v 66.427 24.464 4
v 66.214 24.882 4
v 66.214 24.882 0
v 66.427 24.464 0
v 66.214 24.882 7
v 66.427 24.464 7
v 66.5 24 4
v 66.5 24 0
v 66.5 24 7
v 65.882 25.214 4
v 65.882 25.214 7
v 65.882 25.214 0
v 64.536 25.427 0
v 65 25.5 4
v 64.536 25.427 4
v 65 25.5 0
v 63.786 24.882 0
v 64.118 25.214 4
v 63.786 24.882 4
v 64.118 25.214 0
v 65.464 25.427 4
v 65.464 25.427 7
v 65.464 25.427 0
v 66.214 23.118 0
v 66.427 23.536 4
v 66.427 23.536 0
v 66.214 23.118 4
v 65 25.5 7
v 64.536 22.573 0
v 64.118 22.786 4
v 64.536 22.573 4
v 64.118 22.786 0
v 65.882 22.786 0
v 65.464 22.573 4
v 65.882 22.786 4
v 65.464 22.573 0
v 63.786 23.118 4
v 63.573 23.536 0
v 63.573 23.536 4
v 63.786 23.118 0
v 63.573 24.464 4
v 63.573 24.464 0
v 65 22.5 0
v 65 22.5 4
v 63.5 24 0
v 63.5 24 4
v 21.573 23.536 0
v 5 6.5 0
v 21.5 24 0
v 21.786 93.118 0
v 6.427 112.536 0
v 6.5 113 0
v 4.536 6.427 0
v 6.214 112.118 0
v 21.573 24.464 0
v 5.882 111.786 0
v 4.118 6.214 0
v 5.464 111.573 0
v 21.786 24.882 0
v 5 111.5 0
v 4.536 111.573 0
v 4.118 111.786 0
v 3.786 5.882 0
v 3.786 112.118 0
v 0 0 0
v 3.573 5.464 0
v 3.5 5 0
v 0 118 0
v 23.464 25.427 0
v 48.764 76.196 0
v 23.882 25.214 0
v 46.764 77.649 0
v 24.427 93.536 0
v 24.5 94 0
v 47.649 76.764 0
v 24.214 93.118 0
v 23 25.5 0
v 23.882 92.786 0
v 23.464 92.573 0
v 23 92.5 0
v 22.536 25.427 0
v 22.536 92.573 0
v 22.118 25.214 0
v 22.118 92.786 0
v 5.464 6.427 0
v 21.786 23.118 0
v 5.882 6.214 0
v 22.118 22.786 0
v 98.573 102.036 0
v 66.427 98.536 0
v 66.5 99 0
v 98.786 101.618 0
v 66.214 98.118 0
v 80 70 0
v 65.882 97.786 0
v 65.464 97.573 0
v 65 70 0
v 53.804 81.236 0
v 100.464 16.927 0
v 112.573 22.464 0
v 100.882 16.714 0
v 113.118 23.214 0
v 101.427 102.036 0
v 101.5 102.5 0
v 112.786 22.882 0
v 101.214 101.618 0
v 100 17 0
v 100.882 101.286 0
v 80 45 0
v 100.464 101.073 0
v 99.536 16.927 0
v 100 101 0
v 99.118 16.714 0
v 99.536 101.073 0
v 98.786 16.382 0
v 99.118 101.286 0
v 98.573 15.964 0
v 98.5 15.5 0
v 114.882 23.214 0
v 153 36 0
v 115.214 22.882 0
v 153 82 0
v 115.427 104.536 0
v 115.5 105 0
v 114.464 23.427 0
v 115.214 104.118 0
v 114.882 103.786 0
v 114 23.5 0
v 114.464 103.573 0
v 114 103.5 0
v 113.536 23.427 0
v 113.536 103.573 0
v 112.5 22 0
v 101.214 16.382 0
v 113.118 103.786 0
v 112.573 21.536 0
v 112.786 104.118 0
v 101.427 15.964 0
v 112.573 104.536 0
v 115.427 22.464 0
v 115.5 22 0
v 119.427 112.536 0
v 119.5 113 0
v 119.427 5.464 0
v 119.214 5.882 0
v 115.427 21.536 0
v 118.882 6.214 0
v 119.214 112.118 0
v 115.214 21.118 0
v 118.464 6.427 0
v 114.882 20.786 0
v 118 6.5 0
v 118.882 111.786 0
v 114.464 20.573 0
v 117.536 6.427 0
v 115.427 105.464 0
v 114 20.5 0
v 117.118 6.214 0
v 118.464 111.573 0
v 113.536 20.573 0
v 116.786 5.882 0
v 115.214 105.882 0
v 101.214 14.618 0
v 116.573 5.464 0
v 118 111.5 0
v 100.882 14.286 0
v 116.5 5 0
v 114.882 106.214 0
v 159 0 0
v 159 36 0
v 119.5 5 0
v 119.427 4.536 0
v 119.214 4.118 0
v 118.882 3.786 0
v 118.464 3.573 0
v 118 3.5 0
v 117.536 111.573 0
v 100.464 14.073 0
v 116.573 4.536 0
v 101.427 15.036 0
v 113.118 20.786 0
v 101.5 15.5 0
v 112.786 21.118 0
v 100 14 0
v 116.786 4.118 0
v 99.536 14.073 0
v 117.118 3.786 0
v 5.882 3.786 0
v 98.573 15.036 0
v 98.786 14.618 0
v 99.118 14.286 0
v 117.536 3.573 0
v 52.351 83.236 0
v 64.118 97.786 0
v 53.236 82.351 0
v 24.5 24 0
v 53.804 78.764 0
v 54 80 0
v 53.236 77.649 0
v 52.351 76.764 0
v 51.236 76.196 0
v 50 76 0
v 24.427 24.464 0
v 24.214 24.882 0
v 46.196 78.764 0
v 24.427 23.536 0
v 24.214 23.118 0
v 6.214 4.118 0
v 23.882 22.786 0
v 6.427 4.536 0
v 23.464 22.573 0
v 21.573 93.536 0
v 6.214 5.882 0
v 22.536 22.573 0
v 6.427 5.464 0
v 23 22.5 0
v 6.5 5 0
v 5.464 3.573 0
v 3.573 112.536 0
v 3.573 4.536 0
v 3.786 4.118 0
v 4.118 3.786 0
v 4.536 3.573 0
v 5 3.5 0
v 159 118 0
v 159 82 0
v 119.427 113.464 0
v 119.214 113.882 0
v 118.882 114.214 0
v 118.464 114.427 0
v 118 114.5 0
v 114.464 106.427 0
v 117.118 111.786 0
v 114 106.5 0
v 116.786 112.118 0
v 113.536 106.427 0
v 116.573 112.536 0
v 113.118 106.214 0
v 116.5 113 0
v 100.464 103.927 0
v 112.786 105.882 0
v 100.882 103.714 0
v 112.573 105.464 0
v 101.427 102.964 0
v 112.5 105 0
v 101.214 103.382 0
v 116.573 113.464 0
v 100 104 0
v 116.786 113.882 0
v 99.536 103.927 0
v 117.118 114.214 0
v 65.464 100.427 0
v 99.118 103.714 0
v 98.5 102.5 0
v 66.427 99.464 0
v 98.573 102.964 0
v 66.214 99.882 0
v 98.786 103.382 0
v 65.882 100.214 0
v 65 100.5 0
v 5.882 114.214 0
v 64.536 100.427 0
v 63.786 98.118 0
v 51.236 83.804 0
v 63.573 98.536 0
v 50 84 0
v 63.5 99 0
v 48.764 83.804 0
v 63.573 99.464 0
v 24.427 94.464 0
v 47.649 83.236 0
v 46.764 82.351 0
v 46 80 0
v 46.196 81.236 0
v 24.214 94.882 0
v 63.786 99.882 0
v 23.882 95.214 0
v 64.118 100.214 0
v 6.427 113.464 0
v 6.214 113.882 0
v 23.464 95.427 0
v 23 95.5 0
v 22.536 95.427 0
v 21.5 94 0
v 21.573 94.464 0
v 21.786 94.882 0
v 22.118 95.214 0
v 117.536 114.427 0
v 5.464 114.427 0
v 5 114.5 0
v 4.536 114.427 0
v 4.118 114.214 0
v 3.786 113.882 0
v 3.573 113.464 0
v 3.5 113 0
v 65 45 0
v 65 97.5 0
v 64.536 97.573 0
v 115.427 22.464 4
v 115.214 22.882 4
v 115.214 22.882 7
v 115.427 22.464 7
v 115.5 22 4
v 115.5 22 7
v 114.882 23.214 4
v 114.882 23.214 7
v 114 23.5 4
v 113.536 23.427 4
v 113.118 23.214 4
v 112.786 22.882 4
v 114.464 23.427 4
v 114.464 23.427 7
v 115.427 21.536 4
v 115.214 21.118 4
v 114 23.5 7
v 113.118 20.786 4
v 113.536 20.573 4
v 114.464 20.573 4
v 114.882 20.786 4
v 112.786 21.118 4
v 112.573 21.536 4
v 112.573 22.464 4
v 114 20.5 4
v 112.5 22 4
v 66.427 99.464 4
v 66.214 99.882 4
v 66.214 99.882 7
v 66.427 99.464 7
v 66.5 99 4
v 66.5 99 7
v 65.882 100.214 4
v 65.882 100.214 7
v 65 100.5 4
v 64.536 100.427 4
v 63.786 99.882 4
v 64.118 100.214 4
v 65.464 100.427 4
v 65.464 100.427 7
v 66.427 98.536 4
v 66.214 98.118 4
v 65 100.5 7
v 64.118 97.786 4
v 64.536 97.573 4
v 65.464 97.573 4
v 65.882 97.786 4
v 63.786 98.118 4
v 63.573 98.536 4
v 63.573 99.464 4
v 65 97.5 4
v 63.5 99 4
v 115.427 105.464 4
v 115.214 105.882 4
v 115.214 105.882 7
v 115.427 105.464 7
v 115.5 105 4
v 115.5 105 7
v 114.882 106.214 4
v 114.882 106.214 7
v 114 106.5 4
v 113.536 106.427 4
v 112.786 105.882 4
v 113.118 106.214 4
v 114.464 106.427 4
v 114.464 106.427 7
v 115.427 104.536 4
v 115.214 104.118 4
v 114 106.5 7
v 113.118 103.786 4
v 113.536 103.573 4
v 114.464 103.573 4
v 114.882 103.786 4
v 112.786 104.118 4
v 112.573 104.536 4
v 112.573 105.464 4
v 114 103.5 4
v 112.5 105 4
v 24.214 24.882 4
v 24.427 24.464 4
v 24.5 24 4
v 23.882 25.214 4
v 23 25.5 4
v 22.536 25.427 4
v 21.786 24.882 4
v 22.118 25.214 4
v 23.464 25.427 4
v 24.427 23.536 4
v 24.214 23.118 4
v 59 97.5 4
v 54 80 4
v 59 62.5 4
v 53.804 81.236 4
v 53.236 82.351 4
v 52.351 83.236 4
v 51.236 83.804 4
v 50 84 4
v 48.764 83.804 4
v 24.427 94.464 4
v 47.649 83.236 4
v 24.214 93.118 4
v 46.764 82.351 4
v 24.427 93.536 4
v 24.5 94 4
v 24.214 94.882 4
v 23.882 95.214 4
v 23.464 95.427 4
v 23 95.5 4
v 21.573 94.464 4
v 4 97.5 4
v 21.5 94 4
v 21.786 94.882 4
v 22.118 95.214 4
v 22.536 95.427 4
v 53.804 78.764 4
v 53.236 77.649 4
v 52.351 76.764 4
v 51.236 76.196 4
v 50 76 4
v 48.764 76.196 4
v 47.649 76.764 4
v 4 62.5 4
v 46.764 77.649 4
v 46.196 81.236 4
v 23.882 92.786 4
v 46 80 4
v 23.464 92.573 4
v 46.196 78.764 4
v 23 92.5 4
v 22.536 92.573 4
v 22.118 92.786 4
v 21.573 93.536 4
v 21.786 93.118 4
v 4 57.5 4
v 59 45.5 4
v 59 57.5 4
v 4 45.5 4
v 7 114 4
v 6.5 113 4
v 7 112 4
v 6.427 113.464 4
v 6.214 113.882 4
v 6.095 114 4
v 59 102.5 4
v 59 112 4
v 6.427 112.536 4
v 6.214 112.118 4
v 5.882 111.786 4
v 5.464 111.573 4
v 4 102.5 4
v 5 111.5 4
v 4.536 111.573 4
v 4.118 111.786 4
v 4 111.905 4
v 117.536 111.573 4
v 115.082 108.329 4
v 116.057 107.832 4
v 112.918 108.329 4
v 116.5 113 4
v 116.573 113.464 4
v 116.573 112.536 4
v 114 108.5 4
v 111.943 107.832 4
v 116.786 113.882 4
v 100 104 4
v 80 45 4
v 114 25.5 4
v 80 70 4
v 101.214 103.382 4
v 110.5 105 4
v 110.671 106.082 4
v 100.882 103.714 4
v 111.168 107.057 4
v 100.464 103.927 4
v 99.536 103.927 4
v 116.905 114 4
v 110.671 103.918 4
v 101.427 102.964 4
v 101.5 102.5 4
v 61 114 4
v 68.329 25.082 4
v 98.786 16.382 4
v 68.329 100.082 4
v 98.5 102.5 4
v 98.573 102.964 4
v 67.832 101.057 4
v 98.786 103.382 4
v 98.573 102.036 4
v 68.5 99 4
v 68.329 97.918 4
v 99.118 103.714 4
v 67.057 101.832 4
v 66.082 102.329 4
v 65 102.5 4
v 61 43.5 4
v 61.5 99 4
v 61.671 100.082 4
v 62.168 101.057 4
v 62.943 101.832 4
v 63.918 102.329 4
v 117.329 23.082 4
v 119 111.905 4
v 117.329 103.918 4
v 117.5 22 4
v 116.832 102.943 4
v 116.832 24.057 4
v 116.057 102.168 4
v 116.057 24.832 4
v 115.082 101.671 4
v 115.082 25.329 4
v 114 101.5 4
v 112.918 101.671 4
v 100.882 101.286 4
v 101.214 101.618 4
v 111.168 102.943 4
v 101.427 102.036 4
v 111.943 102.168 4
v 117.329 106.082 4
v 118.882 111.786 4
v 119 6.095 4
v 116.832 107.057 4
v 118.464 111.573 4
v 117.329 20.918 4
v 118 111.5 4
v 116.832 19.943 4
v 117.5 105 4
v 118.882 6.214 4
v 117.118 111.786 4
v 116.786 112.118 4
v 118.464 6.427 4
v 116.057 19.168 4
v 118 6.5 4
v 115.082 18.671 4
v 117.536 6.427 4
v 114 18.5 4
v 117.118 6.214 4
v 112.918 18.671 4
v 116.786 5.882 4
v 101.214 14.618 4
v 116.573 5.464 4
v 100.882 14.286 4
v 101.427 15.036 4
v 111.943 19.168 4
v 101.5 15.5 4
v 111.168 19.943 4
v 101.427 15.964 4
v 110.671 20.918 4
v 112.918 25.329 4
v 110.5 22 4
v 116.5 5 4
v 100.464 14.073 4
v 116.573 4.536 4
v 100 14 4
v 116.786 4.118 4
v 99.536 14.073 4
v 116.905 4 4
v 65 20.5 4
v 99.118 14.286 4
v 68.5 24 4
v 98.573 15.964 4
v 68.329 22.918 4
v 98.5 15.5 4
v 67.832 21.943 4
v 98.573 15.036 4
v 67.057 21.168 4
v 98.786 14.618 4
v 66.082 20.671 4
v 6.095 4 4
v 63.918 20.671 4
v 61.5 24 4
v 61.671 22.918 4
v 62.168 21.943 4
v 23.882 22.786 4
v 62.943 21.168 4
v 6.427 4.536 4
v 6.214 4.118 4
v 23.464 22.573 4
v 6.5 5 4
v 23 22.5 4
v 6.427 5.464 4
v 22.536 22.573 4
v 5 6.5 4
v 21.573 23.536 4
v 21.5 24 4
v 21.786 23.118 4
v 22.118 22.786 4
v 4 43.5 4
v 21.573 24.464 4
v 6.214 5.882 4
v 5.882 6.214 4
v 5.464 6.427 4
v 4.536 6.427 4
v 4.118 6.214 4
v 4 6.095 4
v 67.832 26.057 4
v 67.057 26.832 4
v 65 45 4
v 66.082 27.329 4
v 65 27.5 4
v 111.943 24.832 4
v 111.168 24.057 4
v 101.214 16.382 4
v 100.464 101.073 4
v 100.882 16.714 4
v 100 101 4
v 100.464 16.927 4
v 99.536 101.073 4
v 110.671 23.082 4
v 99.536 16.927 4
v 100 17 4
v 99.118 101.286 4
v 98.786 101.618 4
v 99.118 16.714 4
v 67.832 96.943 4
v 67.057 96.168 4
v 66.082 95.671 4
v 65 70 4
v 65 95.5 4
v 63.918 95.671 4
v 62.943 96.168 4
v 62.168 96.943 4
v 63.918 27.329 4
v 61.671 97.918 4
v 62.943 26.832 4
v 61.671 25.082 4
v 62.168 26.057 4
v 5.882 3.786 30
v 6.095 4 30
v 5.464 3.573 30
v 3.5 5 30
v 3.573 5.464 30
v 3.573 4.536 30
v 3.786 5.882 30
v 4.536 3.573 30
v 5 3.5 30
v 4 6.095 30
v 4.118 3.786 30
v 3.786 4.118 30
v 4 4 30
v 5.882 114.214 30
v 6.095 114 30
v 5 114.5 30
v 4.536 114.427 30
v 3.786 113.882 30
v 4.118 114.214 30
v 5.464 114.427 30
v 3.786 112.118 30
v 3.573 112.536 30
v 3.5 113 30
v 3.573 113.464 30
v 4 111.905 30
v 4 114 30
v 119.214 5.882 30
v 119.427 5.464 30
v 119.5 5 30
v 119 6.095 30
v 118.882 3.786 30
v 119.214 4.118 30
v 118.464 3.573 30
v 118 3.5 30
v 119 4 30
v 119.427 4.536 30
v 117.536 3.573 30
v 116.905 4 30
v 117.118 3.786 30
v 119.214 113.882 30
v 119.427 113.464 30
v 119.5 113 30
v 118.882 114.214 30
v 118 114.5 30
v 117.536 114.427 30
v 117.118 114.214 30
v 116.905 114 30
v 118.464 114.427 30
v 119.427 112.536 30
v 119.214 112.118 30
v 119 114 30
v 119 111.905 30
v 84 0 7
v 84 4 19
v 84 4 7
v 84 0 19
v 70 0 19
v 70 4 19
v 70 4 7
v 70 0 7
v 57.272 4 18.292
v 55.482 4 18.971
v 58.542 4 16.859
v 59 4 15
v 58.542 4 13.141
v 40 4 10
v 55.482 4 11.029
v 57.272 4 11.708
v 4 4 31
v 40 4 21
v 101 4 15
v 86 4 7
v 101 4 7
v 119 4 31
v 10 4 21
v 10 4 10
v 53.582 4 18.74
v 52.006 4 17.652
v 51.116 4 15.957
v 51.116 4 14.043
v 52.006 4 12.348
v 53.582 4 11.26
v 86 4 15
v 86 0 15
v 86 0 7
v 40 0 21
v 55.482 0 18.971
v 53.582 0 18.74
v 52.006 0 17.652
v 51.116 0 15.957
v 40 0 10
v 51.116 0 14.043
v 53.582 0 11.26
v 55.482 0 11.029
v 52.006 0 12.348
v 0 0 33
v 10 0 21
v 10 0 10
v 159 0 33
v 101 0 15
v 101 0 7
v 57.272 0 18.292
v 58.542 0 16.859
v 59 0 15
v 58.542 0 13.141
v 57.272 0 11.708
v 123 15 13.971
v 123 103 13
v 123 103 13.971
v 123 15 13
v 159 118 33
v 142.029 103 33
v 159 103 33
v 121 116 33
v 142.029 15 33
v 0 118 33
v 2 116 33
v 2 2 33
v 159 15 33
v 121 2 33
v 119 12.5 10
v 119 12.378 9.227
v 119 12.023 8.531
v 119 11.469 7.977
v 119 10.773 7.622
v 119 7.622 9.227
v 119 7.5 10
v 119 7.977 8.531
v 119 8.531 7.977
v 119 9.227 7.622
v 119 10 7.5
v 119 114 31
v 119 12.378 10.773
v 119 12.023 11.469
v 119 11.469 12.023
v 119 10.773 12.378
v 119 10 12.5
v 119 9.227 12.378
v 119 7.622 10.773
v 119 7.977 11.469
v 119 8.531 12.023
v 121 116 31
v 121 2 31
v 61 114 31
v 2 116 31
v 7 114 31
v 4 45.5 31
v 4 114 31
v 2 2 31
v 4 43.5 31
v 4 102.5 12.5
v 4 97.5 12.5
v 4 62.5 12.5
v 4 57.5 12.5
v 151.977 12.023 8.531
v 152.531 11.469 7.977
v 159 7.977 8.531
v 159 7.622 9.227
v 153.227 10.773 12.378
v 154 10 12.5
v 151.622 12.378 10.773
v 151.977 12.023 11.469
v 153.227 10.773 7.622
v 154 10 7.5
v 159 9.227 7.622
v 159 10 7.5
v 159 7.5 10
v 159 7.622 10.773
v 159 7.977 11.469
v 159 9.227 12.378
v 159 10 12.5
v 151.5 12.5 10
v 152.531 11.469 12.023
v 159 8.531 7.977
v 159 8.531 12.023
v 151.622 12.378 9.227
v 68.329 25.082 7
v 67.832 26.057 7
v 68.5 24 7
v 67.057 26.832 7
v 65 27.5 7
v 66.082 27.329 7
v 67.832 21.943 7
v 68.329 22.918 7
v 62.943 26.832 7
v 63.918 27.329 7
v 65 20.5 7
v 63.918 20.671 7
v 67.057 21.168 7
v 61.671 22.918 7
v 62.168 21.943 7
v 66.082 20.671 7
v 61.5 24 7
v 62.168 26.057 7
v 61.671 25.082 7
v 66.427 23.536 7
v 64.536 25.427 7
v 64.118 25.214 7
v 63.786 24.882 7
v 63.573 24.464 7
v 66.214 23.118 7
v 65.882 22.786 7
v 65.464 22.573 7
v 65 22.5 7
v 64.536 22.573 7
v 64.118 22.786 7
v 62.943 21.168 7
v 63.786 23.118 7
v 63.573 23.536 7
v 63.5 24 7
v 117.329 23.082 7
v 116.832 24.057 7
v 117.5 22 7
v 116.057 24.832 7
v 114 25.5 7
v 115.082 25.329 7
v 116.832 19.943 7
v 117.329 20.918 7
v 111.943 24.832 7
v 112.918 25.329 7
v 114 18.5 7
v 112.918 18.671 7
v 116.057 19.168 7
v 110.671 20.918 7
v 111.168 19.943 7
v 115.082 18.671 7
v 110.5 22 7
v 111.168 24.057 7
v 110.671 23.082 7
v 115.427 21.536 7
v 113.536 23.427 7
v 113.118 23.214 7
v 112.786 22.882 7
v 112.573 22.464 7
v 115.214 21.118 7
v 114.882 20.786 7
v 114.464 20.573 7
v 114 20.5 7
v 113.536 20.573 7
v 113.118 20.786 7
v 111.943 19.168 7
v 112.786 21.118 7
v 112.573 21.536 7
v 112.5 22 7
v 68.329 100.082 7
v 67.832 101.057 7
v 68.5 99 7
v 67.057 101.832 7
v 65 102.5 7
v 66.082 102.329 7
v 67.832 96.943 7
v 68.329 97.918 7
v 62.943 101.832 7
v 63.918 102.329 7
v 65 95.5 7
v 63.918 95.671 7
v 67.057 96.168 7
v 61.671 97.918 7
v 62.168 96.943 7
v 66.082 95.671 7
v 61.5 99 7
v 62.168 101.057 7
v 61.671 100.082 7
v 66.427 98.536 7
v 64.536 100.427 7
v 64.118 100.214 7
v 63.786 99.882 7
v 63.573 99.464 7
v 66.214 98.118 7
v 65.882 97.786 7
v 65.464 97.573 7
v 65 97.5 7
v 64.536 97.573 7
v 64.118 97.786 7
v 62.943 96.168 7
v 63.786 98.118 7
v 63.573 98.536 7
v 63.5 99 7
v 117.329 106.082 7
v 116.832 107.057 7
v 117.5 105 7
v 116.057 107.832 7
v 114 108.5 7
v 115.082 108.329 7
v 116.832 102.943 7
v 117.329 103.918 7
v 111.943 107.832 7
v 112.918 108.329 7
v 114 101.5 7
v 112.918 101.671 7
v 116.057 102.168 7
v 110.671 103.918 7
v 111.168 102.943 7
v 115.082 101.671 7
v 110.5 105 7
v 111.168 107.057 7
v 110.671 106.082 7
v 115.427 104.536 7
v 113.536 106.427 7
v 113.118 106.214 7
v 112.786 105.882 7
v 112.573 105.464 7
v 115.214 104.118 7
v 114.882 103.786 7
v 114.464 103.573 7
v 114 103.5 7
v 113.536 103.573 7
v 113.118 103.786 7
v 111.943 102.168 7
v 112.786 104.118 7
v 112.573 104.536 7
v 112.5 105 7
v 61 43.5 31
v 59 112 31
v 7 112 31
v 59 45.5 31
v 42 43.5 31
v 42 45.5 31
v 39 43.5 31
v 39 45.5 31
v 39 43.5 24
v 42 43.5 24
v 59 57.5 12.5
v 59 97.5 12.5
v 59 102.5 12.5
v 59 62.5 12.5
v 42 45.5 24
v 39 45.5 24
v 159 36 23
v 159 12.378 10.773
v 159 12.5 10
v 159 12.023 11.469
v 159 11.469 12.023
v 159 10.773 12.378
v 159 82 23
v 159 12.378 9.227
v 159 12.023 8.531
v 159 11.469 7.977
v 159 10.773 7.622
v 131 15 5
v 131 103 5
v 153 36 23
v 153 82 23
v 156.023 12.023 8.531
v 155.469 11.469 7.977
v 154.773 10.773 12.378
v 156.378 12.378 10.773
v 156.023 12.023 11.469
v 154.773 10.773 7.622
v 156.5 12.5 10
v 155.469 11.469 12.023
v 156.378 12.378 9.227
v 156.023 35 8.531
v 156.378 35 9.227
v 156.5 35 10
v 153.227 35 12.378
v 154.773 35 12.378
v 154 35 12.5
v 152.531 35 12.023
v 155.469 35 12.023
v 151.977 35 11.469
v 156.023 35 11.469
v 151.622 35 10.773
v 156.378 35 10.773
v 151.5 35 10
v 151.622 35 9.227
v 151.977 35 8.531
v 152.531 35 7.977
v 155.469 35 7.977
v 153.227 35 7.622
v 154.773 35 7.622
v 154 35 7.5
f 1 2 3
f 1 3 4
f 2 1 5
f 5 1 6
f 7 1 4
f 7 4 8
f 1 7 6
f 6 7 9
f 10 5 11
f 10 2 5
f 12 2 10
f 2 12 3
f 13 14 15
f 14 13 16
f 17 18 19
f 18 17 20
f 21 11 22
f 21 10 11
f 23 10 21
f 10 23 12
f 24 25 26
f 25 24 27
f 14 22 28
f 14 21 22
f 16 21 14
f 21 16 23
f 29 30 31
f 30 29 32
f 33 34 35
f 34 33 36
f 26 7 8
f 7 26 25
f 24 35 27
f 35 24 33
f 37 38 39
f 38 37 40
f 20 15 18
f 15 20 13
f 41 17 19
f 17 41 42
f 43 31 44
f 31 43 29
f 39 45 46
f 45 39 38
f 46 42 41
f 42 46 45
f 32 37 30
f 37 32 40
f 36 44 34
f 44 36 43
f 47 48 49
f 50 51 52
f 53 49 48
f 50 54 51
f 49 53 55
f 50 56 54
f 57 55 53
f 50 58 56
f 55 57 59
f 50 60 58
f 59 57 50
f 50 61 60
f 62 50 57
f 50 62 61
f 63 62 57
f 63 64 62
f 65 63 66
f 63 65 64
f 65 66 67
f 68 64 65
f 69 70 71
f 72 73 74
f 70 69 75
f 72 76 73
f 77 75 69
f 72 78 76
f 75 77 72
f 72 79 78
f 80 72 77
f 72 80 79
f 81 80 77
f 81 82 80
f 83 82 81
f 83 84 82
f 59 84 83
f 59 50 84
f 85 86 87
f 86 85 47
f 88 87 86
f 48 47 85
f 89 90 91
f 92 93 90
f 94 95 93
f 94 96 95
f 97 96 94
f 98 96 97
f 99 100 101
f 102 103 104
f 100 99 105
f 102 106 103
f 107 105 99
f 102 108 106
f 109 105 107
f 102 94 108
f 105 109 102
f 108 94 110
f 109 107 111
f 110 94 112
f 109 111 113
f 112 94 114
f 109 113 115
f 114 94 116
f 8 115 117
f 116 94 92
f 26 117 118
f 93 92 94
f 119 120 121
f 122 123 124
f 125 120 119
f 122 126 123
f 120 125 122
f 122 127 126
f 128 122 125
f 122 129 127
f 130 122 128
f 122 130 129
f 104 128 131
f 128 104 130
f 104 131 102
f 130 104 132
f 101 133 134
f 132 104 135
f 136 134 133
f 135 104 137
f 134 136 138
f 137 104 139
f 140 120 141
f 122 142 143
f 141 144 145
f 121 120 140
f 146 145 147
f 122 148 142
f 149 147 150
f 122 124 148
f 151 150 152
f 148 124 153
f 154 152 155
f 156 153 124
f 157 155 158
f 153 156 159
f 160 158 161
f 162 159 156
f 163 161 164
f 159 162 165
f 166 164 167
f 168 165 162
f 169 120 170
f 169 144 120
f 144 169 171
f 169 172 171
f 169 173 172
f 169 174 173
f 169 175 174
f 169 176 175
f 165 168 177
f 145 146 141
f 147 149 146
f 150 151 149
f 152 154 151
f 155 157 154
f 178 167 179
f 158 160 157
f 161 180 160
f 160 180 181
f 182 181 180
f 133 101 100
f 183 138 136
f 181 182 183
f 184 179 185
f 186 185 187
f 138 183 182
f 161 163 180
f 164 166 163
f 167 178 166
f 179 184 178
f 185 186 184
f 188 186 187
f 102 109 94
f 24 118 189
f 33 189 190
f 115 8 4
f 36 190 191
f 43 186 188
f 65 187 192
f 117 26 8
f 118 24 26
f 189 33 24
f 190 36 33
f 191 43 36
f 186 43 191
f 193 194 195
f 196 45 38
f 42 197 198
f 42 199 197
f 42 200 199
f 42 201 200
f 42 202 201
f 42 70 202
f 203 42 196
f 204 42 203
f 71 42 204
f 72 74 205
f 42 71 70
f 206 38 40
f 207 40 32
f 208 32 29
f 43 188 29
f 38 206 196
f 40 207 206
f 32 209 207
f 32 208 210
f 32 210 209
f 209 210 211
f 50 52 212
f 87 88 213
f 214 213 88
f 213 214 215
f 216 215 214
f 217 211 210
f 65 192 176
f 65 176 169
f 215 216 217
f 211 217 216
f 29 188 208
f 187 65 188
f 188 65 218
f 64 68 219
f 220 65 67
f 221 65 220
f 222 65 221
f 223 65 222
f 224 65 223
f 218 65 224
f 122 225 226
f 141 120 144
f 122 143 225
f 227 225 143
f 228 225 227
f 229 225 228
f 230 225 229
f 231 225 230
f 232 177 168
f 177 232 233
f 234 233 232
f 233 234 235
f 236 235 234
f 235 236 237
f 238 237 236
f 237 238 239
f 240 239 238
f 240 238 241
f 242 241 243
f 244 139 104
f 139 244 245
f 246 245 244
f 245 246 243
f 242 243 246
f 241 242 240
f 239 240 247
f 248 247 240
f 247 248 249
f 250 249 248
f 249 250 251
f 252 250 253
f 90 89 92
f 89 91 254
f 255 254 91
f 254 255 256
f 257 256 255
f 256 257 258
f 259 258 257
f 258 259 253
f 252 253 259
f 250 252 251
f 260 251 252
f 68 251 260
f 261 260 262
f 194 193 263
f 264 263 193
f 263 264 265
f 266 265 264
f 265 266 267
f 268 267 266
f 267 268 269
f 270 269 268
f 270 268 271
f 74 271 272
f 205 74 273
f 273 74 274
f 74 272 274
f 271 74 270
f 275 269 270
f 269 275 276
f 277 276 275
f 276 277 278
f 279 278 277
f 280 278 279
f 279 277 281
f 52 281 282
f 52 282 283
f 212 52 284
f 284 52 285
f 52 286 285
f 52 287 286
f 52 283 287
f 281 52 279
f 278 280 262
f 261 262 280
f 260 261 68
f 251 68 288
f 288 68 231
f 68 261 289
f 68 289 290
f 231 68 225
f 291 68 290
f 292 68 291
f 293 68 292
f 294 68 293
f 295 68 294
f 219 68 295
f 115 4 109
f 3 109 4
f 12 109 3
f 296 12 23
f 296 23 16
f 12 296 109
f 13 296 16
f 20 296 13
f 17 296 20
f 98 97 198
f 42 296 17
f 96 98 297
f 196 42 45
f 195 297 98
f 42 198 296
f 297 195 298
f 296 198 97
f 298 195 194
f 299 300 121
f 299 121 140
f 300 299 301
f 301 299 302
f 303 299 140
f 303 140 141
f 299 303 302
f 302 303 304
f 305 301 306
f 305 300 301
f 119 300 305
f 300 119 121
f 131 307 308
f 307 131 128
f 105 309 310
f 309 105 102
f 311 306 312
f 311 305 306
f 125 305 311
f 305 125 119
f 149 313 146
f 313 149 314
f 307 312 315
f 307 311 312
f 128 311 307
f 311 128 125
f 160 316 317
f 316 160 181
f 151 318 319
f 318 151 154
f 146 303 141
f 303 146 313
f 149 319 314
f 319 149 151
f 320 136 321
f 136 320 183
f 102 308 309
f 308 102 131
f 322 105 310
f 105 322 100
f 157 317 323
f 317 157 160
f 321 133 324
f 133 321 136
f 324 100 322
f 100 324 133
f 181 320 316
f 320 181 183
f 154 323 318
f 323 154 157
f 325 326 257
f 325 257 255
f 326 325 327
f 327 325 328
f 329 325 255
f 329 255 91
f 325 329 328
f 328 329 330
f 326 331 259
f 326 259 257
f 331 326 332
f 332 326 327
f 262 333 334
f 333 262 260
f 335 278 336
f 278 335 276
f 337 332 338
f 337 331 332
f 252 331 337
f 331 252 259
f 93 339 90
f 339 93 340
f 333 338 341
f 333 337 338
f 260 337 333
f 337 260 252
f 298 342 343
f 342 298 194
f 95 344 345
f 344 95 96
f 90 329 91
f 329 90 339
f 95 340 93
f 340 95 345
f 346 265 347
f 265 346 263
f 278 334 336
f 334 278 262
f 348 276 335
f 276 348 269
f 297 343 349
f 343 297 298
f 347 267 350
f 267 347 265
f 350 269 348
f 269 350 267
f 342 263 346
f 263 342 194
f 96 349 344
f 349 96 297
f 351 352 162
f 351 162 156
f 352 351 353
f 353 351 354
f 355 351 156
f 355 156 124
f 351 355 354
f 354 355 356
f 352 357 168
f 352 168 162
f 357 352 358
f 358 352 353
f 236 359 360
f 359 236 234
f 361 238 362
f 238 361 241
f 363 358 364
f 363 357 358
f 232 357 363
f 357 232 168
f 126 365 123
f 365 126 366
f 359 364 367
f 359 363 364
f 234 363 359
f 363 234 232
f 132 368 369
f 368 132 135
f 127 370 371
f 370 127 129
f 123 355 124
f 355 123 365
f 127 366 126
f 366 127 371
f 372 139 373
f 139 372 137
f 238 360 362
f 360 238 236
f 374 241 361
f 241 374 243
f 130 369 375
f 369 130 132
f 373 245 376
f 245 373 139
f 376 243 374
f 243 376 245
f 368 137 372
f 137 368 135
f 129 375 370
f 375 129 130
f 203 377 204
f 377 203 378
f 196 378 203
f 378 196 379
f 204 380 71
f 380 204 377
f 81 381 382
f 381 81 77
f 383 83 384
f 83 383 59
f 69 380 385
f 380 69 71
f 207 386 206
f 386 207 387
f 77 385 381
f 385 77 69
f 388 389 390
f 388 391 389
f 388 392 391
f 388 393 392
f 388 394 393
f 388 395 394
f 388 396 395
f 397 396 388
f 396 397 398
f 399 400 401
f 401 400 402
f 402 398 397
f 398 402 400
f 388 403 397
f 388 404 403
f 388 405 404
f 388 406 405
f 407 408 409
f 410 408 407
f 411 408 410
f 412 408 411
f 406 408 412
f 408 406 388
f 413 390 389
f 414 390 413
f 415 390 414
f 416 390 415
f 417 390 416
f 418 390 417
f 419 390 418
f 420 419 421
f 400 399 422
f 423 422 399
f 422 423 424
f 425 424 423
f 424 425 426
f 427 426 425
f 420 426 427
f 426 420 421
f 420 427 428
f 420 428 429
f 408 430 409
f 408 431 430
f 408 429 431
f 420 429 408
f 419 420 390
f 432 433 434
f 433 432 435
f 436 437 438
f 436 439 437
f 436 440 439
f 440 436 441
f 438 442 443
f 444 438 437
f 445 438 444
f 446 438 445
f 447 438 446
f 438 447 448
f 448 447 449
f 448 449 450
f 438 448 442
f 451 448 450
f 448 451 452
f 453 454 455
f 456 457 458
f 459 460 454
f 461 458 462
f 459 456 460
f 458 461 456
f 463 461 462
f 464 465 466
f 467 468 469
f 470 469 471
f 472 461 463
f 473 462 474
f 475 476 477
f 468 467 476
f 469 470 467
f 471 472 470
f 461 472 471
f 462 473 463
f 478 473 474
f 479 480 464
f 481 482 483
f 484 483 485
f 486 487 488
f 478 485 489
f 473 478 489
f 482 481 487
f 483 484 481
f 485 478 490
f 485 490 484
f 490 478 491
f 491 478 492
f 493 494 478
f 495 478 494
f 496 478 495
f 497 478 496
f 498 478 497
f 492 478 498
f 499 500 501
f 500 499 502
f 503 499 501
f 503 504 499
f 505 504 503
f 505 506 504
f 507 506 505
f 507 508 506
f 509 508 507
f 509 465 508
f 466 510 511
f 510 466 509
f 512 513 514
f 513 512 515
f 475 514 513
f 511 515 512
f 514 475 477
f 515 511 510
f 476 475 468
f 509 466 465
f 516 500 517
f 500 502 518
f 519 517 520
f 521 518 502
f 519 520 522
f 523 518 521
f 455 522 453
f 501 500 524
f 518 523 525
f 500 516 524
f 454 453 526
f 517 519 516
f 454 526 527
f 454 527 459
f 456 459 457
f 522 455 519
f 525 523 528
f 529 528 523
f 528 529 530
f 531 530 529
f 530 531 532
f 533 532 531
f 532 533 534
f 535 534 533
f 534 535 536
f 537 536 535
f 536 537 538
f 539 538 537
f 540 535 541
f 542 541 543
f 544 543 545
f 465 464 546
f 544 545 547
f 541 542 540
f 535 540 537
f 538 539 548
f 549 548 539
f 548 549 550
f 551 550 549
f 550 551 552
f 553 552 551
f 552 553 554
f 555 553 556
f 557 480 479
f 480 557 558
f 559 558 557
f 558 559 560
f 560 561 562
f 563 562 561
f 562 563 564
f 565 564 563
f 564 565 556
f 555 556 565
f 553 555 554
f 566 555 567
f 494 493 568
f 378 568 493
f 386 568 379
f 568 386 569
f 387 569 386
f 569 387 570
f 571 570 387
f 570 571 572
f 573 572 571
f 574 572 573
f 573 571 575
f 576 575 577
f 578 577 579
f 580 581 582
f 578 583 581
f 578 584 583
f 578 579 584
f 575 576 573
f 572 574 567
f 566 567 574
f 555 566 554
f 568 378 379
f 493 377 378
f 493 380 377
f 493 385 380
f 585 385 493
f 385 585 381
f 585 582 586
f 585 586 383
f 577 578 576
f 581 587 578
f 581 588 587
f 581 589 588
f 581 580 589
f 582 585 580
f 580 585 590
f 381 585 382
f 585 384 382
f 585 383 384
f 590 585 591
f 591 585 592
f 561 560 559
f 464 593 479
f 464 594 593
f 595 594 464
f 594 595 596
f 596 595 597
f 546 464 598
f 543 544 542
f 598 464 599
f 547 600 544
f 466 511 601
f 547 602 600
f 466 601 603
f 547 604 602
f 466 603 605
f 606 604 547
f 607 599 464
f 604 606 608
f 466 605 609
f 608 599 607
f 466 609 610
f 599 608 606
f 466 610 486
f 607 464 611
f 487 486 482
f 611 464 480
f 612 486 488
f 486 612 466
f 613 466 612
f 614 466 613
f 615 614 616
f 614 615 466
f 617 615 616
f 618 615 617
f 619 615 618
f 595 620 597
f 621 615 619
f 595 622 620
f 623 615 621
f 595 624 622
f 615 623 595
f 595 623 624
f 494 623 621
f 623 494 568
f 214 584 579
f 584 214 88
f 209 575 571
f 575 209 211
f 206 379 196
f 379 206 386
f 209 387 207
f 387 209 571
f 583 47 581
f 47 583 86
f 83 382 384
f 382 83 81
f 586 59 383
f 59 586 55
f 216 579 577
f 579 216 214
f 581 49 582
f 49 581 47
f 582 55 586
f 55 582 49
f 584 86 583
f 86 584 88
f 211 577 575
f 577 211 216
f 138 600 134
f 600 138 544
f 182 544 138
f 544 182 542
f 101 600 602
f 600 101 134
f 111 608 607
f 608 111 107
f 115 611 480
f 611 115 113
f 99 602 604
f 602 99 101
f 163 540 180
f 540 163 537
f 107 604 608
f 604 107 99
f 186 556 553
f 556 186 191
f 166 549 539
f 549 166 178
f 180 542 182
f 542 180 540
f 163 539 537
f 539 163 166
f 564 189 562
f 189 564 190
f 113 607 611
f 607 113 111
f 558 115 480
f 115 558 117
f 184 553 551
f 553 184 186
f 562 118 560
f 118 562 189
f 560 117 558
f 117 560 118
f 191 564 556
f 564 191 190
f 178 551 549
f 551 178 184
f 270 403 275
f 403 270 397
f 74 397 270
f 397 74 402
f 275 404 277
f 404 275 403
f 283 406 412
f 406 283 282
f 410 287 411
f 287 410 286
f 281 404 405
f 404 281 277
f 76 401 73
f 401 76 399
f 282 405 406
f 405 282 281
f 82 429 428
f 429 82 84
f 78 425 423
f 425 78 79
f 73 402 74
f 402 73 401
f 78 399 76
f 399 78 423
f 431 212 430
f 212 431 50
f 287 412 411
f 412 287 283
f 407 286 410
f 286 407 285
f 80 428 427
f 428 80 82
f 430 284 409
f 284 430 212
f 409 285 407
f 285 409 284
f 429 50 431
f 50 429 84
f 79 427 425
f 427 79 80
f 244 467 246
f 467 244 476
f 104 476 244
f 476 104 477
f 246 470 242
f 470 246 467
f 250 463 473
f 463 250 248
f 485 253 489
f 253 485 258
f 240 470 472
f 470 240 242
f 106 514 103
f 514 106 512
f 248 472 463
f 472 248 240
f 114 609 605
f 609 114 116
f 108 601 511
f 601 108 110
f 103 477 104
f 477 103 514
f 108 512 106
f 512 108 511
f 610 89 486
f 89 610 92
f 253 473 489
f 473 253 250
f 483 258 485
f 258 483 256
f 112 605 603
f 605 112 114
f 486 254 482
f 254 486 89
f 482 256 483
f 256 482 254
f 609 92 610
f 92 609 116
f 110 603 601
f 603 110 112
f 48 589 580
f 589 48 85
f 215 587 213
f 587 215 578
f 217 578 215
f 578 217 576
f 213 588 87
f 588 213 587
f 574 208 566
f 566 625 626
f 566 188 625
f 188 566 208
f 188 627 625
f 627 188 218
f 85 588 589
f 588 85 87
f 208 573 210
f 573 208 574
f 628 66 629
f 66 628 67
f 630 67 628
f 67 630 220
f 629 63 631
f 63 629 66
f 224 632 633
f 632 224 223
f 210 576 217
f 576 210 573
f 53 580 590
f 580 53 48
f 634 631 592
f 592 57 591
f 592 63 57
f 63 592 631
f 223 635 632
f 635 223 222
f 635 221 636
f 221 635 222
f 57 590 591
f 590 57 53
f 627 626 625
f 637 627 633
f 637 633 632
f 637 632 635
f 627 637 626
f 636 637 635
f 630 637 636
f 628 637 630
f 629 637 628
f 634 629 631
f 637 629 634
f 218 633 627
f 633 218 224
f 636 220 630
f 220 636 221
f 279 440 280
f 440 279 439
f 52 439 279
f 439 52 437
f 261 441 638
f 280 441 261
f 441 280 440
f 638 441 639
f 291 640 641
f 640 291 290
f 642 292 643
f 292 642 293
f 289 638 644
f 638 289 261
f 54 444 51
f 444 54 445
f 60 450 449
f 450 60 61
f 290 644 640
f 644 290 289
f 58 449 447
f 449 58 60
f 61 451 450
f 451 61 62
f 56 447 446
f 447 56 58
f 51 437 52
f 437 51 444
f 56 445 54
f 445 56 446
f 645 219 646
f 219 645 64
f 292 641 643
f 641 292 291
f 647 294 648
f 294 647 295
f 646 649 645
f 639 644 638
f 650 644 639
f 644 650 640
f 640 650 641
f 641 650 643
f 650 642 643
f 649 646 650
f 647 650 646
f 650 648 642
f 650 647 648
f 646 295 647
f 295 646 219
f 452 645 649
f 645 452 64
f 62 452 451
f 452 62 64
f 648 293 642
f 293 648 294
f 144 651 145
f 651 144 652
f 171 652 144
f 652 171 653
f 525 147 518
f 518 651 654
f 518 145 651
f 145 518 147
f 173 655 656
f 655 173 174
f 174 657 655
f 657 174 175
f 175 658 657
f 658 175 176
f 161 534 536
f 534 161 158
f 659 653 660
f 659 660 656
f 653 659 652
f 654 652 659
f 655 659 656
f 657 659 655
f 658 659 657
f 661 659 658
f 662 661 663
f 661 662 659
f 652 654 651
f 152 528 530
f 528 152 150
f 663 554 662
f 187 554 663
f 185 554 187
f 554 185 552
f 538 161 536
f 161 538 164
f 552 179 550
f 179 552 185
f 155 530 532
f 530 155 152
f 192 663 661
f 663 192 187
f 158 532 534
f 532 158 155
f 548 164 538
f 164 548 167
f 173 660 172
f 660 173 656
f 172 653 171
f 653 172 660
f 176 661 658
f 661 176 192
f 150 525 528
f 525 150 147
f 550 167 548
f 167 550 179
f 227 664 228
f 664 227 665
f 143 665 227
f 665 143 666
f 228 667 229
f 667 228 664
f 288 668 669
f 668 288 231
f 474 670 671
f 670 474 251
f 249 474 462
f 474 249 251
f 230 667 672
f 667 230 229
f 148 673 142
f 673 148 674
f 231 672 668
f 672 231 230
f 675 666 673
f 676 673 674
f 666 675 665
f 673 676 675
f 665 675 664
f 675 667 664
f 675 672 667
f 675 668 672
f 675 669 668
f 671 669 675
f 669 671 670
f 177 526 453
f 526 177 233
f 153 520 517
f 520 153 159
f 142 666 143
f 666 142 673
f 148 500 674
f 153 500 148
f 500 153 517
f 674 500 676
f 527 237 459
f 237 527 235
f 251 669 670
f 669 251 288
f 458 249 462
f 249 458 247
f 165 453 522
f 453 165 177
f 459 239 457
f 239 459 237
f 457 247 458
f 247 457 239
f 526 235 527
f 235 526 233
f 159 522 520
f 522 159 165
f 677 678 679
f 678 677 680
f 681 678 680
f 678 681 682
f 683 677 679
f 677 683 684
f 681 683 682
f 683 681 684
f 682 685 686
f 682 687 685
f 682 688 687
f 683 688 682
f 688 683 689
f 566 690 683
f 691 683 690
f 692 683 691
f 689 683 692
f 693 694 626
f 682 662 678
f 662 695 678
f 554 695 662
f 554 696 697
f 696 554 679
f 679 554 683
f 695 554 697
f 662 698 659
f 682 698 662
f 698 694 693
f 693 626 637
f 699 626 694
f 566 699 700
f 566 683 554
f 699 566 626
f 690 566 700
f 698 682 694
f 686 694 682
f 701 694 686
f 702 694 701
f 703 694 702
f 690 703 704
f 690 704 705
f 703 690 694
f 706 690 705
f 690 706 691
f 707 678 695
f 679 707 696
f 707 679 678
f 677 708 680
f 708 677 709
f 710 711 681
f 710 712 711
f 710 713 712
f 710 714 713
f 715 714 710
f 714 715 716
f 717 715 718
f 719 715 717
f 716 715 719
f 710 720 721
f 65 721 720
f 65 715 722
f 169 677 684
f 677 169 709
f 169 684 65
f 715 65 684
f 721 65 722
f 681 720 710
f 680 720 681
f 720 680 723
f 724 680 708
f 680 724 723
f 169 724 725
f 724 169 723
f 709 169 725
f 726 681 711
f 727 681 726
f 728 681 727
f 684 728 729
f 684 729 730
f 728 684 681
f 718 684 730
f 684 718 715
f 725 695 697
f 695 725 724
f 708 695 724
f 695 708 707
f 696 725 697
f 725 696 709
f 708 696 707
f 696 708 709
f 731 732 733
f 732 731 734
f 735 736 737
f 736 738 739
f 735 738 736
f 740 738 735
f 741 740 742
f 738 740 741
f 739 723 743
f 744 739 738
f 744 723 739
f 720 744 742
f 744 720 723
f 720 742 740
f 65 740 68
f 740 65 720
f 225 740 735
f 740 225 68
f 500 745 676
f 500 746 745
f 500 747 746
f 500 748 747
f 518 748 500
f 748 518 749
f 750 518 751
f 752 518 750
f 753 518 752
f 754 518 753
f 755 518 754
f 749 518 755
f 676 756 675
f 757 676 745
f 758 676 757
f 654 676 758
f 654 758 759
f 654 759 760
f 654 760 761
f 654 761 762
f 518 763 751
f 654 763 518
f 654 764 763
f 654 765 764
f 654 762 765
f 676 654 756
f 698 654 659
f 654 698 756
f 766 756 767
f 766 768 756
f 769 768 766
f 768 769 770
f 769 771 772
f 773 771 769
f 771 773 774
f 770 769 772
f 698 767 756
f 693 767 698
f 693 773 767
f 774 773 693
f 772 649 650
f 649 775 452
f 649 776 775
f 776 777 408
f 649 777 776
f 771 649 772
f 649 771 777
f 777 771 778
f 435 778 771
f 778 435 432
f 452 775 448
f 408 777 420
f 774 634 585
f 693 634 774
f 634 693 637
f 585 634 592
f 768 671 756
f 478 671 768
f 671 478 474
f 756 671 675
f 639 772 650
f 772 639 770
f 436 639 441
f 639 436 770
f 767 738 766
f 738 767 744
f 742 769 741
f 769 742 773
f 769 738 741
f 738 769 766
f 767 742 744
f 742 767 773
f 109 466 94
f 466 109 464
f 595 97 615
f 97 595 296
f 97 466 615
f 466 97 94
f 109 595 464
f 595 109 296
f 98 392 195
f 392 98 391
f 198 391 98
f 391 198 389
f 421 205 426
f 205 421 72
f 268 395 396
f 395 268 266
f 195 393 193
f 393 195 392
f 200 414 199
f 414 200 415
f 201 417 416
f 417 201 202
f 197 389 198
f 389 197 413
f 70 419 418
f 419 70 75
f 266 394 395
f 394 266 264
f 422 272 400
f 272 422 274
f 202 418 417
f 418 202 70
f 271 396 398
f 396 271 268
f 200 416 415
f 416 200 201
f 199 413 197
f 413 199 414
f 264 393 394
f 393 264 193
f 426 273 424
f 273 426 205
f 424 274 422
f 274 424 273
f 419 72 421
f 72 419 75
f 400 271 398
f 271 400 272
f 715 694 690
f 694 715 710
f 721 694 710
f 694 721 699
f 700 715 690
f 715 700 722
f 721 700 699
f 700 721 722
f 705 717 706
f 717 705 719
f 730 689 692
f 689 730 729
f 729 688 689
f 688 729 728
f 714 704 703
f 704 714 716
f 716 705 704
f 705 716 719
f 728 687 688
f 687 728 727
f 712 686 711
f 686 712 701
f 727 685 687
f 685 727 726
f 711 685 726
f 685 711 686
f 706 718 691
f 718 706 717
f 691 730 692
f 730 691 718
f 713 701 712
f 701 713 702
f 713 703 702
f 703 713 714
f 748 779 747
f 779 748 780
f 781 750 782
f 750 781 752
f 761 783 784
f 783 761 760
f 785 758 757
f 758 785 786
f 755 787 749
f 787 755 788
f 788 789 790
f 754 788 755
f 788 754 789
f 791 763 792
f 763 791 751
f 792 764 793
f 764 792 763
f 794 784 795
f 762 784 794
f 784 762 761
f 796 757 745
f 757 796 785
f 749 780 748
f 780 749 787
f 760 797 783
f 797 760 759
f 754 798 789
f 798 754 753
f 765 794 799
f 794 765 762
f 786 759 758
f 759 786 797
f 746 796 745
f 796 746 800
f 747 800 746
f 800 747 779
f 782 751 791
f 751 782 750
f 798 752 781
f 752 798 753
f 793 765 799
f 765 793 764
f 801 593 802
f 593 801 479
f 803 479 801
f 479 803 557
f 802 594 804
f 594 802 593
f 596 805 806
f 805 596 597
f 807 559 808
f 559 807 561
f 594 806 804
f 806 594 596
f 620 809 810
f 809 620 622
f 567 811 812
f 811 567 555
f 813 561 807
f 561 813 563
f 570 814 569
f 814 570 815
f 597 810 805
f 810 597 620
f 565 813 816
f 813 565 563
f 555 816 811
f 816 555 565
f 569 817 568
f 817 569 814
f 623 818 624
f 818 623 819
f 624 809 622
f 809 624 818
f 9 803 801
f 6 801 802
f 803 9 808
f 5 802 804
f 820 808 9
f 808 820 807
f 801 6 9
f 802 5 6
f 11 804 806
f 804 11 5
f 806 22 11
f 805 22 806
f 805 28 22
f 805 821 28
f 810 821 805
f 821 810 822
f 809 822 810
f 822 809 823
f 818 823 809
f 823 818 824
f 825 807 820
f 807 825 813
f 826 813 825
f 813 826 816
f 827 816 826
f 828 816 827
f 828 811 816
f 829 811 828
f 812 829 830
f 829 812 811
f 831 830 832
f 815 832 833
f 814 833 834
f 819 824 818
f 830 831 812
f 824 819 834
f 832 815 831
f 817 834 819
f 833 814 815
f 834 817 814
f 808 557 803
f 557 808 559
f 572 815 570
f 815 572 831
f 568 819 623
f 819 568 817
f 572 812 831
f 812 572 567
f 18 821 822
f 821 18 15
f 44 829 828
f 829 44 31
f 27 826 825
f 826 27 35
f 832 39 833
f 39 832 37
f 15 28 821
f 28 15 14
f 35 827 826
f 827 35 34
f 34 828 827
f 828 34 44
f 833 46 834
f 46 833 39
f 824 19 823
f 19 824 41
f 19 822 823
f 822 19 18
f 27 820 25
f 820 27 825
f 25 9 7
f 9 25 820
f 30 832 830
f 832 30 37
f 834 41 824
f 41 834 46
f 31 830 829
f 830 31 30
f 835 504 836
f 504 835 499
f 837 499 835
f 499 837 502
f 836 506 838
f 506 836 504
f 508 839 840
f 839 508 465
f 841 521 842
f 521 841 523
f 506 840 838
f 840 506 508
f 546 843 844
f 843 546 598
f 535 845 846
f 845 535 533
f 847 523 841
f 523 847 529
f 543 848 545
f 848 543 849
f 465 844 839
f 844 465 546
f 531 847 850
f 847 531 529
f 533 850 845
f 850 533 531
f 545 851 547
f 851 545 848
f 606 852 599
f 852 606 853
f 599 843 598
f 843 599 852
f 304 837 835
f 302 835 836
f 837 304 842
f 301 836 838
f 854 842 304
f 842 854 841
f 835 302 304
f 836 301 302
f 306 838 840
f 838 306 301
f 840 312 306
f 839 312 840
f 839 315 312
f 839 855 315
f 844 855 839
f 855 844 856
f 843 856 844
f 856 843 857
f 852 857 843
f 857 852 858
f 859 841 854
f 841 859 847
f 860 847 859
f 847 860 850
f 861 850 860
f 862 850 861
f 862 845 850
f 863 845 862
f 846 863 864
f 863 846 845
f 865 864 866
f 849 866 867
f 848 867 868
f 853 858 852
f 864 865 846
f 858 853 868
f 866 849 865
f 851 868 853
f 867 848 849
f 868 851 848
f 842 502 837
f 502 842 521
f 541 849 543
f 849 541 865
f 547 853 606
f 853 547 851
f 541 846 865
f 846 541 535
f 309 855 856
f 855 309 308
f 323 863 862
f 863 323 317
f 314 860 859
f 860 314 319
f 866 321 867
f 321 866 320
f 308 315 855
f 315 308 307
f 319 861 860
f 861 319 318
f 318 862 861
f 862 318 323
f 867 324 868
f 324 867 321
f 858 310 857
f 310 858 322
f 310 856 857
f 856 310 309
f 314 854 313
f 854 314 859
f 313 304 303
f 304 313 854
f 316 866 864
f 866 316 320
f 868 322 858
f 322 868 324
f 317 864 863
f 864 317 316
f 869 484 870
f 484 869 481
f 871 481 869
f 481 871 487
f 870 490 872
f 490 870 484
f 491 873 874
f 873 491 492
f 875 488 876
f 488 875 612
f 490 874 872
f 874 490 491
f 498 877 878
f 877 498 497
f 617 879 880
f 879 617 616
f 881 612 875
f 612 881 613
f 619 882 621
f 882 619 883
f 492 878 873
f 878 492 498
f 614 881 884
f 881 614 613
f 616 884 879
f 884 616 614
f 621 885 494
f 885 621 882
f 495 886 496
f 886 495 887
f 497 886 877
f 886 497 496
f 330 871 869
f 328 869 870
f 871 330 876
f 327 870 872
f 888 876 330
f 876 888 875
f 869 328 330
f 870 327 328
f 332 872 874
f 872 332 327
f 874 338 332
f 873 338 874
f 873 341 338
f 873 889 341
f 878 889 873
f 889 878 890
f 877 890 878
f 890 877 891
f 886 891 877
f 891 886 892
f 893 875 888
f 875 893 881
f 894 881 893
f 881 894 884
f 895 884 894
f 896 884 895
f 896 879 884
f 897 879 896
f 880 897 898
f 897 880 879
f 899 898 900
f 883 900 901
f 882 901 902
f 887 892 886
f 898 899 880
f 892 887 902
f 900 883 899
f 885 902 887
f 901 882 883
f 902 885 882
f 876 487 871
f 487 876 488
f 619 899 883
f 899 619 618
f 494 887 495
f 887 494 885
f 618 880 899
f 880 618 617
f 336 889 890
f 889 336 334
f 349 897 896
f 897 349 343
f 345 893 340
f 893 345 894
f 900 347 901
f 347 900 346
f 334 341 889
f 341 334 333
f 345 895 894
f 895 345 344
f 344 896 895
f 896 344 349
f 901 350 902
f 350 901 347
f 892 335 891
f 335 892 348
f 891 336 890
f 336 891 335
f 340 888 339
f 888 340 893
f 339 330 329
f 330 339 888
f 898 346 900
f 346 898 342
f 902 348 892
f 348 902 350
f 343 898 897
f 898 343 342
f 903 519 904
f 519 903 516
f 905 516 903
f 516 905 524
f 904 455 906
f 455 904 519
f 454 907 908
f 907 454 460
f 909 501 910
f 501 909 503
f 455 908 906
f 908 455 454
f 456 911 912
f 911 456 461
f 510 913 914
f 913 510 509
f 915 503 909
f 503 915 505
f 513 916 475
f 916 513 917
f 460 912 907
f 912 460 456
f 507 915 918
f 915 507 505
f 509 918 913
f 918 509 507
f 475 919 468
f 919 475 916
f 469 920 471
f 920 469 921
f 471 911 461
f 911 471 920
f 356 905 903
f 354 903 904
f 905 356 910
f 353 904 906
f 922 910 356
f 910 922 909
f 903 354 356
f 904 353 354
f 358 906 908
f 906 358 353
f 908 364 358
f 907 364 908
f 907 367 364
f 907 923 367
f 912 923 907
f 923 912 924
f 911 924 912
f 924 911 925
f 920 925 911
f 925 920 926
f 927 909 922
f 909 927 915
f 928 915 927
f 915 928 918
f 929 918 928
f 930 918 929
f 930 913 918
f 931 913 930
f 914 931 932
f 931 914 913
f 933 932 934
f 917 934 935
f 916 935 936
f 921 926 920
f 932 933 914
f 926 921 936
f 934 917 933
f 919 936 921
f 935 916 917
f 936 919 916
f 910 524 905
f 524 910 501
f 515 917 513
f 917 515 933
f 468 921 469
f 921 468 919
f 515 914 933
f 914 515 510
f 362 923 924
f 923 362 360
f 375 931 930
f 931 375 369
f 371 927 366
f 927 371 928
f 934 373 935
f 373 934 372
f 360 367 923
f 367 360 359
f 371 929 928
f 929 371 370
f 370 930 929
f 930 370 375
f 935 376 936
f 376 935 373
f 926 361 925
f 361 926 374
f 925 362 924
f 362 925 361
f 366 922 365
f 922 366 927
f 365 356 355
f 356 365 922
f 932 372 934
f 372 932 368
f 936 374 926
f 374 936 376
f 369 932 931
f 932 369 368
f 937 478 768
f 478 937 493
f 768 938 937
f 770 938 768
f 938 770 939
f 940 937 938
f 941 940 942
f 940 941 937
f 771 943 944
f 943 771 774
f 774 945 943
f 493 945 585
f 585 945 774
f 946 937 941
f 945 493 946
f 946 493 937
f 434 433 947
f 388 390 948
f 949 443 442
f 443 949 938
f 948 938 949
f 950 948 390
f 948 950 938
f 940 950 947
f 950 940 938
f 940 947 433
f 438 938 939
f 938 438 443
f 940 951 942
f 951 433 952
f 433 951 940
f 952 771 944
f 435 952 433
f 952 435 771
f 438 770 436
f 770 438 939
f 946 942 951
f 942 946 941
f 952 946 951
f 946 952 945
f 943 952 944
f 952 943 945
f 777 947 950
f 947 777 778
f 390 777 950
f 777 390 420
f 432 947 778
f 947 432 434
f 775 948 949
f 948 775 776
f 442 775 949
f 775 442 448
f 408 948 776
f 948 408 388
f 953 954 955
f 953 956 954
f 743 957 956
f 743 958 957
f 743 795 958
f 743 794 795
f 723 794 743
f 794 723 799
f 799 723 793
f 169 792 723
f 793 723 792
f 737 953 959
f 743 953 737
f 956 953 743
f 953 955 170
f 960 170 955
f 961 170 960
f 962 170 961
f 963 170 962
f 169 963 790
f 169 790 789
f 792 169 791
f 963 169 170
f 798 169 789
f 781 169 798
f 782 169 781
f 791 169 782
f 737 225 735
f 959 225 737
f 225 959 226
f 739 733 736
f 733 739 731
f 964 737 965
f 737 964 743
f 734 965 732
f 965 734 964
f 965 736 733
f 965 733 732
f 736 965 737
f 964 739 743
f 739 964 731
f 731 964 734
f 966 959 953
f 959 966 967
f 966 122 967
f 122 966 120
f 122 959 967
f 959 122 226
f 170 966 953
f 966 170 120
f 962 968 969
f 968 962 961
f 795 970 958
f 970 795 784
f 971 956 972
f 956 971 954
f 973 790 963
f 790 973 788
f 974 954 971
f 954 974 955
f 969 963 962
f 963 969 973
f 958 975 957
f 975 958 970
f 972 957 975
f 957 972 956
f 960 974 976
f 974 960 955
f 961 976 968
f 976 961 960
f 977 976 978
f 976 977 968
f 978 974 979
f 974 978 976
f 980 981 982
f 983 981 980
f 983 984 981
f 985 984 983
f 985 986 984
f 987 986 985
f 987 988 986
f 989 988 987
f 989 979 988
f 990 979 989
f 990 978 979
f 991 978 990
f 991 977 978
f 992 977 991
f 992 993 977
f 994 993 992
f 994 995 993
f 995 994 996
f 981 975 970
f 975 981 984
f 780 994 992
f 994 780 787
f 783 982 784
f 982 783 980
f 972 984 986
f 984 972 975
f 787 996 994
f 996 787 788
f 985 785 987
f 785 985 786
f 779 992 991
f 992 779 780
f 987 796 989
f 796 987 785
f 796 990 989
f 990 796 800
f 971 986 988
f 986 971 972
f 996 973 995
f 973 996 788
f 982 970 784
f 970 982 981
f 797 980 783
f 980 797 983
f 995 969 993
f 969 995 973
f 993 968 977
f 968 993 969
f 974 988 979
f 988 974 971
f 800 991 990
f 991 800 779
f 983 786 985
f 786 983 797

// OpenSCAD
// Inner dimensions
length = 115;
width = 110;
height = 27;
thickness = 4;

// Quality
FN = 20;

// Battery Parameters
batteryLength = 66.5;
batteryWidth = 55.0;
batteryHeight = 18.5;

// Ultrasonic sensor
sensorLength = 46;
sensorDepth = 6;
sensorHeight = 23;

difference()
{
	// Outter cube
	cube([length+2*thickness, width+2*thickness, height+thickness+2]);

	// Inner cube
	translate([thickness, thickness, thickness])
	{
		cube([length, width, height]);
	}

	// Plexiglass tooth
	translate([2, 2, height+thickness])
	{
		cube([length+4, width+4, thickness]);
	}

	// h-bridge cable hole
	translate([65, 45, 0])
	{
		cube([15, 25, 5]);
	}

	// Component mounting holes
	translate([thickness, thickness, 0])
	{	
		screw_hole_component(61,20);
		screw_hole_component(110,18);
		screw_hole_component(61,95);
		screw_hole_component(110,101);
		
		screw_hole_base(19,20);
		screw_hole_base(96,11.5);
		screw_hole_base(19,90);
		screw_hole_base(96,98.5);

		// Plexi-Glass holes
		screw_hole_component(1,1);
		screw_hole_component(1,109);
		screw_hole_component(114,1);
		screw_hole_component(114,109);
		
	}

	// Battery removal hole
	translate([50, 80, 0]) cylinder(h = 5, r = 4, $fn = FN);

	// Power switch
	translate([10, 0, 10])
	{
		cube([30, thickness, 11]);
	}

	// Power plug
	translate([55, -1, 15])
	{
		rotate([-90, 0, 0]) cylinder(h = thickness+2, r = 4);
	}

	// Arduino holes
	translate([66+thickness, 0, 3+thickness])
	{
		cube([14, thickness, 12]);
	
		translate([16, 0, 0])
		{
			cube([15, thickness, 8]);
		}
	}

	// sensor wire hole
	translate([thickness+length-2, 10, 10])
	{
		rotate([0,90,0]) cylinder(h=8, r=2.5, $fn=FN);
	}

}

// Component spacers
translate([thickness, thickness, 0])
{	
	
	component_spacer(61,20);
	component_spacer(110,18);
	component_spacer(61,95);
	component_spacer(110,101);
	
}

// Battery holder & spacers
translate([thickness, thickness, thickness])
{
	translate([0, width-batteryLength-4, 0])
	{
		difference()
		{
			cube([batteryWidth+2, batteryLength+4, height]);
			translate([0, 2, 0]) cube([batteryWidth, batteryLength, height]);
			translate([0, batteryLength+1, 0]) cube([3, 3, height]);
			// cable hole
			translate([35,0,20]) cube([3,2,height-20]);
		}
	}
	translate([0, width-batteryLength+10, 0]) cube([batteryWidth, 5, height-batteryHeight]);
	translate([0, width-batteryLength+50, 0]) cube([batteryWidth, 5, height-batteryHeight]);

}

// Phone mount
phoneWidth = width+2*thickness;
phoneLength = 36;
phoneHeight = height +thickness+2;

translate([2*thickness+length, 0 ,0])
{

difference()
{
	cube([phoneLength, phoneWidth, phoneHeight]);
	translate([8, 15, 5]) rotate([0, -45, 0]) cube([phoneLength+10, phoneWidth-30, 12]);

	// Ultrasonic sensor
	translate([phoneLength - sensorDepth, phoneWidth/2 - sensorLength/2, 0]) cube([ sensorDepth, sensorLength, sensorHeight]);

	// Cables holes
	translate([-10, 10, 10]) rotate([0, 90, 0]) cylinder(h = phoneLength+12, r = 2.5, $fn = 20);
	translate([phoneLength-5, 10, 10]) rotate([-90, 0, 0]) cylinder(h = 25, r = 2.5, $fn = 20);

}
}


/******************************************************/

module screw_hole_component(x,y)
{
	translate([x, y])
	{
		cylinder(h = 30, r = 1.5, $fn = FN);
//		sphere(r = 2, $fn = FN);
	}
}

module component_spacer(x,y)
{
	translate([x, y, thickness])
	{
		difference()
		{
			cylinder(h = 3, r = 3.5, $fn = FN);
			cylinder(h = 3, r = 1.5, $fn = FN);
		}
	}
}

module screw_hole_base(x,y)
{
	translate([x, y])
	{
		union()
		{
			cylinder(h = thickness, r = 1.5, $fn = FN);
//			translate([0,0,thickness]) sphere(r = 2, $fn = FN);
		}
	}
}
